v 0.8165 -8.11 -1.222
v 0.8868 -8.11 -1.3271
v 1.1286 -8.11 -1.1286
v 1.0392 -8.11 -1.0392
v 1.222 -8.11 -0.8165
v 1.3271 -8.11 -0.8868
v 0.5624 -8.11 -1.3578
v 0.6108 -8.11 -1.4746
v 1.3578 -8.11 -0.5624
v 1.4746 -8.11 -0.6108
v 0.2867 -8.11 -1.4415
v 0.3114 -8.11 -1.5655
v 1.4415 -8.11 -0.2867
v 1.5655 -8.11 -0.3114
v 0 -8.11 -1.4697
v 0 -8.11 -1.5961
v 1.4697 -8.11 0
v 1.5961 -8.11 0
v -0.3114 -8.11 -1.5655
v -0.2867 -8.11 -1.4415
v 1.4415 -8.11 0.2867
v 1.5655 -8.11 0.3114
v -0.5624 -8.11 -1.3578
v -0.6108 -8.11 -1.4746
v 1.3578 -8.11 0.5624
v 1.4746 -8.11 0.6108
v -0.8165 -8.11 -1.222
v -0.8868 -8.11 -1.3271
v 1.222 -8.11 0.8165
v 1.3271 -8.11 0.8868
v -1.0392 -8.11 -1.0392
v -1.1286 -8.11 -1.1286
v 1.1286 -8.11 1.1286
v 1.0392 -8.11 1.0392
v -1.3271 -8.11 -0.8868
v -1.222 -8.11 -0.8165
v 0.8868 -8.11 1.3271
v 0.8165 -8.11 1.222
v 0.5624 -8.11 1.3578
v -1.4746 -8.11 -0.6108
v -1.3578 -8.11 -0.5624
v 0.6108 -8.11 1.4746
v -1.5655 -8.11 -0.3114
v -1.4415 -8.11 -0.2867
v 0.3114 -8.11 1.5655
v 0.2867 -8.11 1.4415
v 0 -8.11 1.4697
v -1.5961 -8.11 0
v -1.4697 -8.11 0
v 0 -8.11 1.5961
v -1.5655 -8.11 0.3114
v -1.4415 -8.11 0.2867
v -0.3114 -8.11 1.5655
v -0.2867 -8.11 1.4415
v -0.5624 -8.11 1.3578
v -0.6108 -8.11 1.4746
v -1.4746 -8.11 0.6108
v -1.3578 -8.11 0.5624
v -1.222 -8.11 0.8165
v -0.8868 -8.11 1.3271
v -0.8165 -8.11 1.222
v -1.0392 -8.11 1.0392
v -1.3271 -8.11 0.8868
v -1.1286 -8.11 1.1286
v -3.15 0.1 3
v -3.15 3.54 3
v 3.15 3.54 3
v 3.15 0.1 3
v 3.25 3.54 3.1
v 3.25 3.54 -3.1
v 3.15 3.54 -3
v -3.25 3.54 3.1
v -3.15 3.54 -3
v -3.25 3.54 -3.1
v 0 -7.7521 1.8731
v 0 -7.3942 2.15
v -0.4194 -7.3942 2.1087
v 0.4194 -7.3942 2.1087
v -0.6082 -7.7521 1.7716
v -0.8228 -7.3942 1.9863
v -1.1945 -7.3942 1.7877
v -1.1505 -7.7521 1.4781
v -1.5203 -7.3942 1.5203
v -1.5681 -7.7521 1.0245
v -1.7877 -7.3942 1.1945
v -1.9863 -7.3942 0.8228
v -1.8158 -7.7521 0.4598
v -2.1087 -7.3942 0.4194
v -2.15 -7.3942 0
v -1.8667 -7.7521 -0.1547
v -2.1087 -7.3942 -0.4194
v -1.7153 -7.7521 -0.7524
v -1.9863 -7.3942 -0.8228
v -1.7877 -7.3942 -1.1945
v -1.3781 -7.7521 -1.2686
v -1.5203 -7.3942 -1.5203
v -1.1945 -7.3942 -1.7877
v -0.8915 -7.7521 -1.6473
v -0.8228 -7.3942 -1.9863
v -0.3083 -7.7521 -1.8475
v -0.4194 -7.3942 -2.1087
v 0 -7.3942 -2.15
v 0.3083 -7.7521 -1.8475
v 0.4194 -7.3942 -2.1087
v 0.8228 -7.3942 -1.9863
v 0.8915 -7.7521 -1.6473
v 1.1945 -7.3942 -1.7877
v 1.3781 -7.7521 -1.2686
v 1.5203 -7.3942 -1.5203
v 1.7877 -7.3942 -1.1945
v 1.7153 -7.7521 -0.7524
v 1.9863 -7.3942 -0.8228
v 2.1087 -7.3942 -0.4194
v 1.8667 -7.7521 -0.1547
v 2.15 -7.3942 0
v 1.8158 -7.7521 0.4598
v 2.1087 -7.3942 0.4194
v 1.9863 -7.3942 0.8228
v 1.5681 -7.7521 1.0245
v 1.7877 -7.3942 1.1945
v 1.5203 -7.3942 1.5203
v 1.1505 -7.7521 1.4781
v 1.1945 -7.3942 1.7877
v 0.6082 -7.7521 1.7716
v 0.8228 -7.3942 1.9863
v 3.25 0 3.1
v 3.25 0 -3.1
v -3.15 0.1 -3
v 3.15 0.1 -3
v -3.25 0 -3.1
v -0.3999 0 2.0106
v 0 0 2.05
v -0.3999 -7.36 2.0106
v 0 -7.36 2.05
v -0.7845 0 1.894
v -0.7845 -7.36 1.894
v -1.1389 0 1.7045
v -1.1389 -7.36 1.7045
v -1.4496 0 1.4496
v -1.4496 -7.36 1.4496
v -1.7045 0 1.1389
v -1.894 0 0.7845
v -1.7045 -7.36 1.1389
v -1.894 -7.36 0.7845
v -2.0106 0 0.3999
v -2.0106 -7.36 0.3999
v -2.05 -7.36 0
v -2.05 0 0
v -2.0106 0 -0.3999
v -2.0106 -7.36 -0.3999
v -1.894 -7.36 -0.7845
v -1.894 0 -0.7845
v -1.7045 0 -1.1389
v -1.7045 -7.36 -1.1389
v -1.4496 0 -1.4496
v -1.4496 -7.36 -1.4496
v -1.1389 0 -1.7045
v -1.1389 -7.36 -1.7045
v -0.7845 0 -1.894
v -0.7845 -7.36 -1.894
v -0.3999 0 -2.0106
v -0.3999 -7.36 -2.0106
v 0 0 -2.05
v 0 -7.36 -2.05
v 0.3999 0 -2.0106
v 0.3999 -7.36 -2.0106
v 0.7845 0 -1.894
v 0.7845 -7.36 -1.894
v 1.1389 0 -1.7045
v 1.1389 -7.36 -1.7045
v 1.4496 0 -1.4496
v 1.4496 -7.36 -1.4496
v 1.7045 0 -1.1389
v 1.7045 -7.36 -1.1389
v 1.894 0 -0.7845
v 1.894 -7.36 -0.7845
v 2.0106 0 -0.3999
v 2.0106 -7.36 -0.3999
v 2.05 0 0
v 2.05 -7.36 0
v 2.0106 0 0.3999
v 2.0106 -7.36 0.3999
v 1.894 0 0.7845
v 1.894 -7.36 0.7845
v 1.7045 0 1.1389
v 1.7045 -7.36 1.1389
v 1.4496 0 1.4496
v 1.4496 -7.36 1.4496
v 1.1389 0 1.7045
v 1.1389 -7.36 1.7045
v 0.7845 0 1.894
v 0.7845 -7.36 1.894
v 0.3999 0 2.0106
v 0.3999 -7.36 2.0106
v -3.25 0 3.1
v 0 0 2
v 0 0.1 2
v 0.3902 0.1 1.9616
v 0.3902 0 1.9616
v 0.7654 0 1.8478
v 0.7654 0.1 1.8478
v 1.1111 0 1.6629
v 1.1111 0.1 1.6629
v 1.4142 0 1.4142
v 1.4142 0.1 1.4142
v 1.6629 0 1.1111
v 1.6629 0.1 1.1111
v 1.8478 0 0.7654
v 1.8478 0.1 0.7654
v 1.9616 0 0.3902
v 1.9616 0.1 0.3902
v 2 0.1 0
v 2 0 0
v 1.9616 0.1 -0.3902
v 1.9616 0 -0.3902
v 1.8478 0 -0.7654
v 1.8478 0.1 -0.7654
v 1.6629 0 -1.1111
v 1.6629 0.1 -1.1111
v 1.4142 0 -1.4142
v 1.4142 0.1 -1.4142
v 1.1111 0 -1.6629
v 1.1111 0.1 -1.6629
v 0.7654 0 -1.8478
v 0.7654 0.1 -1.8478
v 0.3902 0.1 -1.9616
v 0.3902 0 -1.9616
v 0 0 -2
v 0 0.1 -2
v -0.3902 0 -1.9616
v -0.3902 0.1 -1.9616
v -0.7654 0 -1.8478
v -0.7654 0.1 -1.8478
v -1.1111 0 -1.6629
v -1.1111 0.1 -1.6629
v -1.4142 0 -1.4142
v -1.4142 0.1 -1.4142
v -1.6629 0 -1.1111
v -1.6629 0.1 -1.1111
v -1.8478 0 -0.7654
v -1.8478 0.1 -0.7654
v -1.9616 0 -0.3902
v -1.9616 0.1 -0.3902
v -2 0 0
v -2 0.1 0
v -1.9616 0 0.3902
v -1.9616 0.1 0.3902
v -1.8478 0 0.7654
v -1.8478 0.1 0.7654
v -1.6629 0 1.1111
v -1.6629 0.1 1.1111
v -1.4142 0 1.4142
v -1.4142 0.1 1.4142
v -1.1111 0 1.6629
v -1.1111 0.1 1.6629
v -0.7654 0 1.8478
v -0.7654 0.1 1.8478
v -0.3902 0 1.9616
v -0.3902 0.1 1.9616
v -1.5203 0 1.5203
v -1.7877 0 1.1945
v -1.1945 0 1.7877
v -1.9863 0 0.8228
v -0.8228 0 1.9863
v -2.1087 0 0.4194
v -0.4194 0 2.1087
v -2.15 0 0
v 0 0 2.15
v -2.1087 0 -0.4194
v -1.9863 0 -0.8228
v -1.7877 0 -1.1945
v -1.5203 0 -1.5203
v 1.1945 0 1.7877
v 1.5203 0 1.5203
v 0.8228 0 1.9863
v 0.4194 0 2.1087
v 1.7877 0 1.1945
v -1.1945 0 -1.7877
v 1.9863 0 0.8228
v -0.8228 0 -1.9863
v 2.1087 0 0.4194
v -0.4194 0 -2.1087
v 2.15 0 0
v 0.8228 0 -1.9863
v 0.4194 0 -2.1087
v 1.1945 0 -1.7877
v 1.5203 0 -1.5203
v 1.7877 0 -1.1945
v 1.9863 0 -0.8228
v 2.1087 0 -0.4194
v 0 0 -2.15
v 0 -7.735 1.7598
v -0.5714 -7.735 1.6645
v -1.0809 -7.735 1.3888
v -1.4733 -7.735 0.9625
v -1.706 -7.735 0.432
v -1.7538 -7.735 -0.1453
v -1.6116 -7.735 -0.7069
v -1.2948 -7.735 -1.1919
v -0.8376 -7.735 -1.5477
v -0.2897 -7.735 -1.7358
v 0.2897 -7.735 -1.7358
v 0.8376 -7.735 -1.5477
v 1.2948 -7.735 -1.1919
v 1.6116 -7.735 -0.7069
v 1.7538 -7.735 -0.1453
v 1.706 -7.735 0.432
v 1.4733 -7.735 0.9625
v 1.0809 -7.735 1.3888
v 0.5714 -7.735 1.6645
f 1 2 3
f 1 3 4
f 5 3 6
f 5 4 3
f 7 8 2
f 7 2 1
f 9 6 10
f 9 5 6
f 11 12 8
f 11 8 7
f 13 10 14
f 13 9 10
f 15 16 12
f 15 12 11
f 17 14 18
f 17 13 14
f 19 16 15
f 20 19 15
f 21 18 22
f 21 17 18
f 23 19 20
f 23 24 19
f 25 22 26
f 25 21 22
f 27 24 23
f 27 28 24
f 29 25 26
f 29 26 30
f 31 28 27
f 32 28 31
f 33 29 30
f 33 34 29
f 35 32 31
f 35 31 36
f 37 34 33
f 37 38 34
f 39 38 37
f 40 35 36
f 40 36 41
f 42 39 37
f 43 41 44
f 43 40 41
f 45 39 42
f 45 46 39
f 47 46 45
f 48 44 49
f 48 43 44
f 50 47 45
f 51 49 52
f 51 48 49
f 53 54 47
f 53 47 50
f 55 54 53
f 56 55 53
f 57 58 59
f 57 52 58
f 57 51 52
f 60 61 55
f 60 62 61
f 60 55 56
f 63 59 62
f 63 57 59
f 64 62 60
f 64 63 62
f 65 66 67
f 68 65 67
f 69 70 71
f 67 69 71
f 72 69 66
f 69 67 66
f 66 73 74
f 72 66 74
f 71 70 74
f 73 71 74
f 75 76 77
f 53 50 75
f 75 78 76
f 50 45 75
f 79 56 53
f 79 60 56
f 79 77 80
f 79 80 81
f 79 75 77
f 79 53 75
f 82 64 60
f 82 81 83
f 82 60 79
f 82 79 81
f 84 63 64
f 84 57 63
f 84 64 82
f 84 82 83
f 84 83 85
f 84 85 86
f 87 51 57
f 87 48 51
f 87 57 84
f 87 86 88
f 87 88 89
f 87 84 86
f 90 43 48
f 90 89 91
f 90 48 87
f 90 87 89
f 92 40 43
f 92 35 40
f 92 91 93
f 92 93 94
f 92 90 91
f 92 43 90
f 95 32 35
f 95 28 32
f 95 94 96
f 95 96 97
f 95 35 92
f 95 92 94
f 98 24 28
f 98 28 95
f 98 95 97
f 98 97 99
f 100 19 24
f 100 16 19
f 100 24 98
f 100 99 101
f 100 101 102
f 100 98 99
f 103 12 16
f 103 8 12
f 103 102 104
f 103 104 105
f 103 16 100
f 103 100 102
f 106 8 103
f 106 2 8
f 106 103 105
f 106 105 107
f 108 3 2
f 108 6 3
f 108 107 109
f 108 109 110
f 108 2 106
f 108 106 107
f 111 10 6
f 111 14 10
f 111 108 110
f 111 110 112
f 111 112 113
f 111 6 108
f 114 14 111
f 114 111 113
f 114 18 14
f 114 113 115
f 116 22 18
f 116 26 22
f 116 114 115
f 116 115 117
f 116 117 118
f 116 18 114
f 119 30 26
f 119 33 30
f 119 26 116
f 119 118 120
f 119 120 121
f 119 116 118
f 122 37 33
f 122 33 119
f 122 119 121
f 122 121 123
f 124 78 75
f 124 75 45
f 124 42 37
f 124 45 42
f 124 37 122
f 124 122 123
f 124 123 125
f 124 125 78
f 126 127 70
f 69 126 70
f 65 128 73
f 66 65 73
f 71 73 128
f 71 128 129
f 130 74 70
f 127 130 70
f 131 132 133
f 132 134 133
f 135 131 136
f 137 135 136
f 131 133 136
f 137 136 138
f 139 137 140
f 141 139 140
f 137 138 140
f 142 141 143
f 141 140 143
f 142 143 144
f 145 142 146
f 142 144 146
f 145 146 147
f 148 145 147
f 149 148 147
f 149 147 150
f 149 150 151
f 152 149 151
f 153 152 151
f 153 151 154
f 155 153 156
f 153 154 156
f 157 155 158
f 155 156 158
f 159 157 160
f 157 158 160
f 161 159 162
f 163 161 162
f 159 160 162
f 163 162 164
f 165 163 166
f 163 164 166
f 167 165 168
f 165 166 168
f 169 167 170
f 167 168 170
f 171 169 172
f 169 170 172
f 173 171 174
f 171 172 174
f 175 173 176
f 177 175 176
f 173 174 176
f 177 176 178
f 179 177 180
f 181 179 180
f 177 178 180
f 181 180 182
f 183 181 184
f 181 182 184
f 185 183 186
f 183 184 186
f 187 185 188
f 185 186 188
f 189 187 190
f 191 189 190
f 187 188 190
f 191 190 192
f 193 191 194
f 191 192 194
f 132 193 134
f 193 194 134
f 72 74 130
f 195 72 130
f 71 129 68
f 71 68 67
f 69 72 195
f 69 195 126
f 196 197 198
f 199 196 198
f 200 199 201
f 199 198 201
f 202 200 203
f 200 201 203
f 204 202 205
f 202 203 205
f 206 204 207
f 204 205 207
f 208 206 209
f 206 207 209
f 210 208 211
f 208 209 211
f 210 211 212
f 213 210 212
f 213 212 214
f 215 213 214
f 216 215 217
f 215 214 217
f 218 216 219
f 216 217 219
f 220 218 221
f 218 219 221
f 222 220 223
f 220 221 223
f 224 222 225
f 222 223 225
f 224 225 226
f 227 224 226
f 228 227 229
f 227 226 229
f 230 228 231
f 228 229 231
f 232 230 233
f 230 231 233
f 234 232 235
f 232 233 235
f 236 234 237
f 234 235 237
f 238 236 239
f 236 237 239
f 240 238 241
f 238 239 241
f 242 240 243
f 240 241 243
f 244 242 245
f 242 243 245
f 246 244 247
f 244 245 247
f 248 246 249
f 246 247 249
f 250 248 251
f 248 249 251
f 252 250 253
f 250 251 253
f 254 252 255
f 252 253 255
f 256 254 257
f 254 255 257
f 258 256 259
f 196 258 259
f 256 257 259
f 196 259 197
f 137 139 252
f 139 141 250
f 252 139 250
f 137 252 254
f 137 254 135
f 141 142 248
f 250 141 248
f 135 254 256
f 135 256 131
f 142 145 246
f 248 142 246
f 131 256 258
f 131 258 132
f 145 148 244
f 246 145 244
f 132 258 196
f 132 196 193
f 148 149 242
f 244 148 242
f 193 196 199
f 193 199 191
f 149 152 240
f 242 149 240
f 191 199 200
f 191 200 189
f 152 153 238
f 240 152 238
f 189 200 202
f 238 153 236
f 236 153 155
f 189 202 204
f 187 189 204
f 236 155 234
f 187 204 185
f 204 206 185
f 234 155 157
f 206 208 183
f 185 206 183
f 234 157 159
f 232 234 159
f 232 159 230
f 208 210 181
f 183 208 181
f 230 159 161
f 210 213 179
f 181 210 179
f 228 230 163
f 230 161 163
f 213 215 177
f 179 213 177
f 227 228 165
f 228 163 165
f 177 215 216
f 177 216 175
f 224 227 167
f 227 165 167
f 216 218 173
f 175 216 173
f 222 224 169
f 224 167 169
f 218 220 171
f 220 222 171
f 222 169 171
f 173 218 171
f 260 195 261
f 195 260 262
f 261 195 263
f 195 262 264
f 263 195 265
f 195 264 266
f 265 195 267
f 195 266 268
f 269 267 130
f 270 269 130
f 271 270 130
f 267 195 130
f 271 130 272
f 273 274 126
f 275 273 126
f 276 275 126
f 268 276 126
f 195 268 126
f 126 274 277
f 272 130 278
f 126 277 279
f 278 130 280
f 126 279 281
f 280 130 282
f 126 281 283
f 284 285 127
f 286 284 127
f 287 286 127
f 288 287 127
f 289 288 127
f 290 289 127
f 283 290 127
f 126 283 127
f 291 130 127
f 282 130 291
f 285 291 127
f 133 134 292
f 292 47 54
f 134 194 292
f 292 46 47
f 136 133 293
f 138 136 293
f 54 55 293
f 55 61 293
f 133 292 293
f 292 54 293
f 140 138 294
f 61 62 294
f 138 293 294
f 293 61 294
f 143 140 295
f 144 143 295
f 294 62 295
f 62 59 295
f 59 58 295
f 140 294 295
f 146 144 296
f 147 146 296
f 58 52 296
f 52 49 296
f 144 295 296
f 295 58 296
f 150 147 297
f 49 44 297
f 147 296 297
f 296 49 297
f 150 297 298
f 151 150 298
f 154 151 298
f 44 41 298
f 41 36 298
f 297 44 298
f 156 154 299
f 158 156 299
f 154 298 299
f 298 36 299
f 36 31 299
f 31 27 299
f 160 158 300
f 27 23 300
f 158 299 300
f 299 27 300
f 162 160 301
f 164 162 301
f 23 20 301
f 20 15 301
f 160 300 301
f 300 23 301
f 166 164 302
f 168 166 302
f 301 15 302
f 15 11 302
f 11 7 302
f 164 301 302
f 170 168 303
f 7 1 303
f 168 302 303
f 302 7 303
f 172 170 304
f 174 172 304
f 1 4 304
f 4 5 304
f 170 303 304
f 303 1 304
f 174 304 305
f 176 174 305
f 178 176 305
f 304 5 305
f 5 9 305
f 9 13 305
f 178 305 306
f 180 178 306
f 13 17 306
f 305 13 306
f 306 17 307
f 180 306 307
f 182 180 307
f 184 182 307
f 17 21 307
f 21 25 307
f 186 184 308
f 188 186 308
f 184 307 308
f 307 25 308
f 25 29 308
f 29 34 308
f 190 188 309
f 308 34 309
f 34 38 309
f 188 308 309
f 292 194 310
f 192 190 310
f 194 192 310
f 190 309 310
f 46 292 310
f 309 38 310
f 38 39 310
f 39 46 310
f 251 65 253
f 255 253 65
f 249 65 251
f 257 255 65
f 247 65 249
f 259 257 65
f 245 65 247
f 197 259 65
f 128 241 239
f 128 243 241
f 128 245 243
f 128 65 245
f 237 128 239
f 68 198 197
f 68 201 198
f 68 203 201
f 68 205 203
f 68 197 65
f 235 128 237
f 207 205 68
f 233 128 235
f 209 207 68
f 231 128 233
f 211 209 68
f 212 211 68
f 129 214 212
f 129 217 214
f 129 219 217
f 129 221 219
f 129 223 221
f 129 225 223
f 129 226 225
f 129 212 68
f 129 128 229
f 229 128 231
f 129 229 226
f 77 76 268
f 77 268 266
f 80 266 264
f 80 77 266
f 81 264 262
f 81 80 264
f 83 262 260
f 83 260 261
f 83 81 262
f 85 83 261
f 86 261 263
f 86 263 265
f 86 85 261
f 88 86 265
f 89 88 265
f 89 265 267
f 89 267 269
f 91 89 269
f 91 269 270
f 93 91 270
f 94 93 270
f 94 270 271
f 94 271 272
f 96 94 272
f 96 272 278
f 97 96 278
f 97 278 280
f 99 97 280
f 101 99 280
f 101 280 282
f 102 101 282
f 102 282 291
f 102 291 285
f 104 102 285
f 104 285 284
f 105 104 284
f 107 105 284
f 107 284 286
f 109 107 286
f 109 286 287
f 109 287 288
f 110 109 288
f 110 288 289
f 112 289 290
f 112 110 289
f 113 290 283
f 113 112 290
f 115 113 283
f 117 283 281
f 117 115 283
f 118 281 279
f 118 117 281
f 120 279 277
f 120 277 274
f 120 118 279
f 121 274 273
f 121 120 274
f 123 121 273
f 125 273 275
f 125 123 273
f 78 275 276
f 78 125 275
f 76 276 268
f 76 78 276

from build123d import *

# Parameters (mm, degrees)
SHELL3_T                 = 0.1
BOSS_EXTRUDE1_DEPTH      = 3.1
BOSS_EXTRUDE1_DEPTH_BACK = 3.1
SKETCH1_3_W              = 3.25
SKETCH1_3_H              = 3.54
SHELL4_START             = -3
SHELL4_OUTLINE_W         = 6.3
SHELL4_OUTLINE_H         = 3.44
SHELL4_DEPTH             = 6
SKETCH2_R                = 2
CUT_EXTRUDE2_DEPTH       = 0.1


# Read off the part's stored shape, not the designer's step: Shell4
with BuildPart() as part:
    # Sketch1 → Revolve2 (revolve)
    with BuildSketch(Plane.XY, mode=Mode.PRIVATE) as revolve2_sk:
        Polygon((0, 0), (-2.05, 0), (-2.05, -7.36), (-1.469693846, -8.11), (0, -8.11), align=None)
    revolve(revolve2_sk.sketch.rotate(Axis((0, 19.440747496, 0), (0, -1, 0)), 270), axis=Axis((0, 19.440747496, 0), (0, -1, 0)))

    # Shell3
    shell3_openings = [part.faces().sort_by_distance(p)[0] for p in [
        (0, 0, 0),
        (0, -8.11, 0),
    ]]
    offset(amount=SHELL3_T, openings=shell3_openings, kind=Kind.INTERSECTION)

    # Sketch1<3> → Boss-Extrude1 (add, two sides: drawn at the far end of the back side and taken through both)
    with BuildSketch(Plane.XY.offset(-BOSS_EXTRUDE1_DEPTH_BACK)):
        Polygon((-3.25, 3.54), (-3.25, 0), (-2.05, 0), (0, 0), (0, 3.54), align=None)
        with Locations((1.625, 1.77)):
            Rectangle(SKETCH1_3_W, SKETCH1_3_H)
    extrude(amount=BOSS_EXTRUDE1_DEPTH + BOSS_EXTRUDE1_DEPTH_BACK)

    # Shell4 outline → Shell4 (cut)
    with BuildSketch(Plane.XY.offset(SHELL4_START)):
        with Locations((0, 1.82)):
            Rectangle(SHELL4_OUTLINE_W, SHELL4_OUTLINE_H)
    extrude(amount=SHELL4_DEPTH, mode=Mode.SUBTRACT)

    # Sketch2 → Cut-Extrude2 (cut)
    with BuildSketch(Plane(origin=(0, 0.1, 0), x_dir=(1, 0, 0), z_dir=(0, 1, 0))):
        with Locations(Location((0, 0, 0), (0, 0, 270))):
            Circle(SKETCH2_R)
    extrude(amount=-CUT_EXTRUDE2_DEPTH, mode=Mode.SUBTRACT)


solid = part.part
